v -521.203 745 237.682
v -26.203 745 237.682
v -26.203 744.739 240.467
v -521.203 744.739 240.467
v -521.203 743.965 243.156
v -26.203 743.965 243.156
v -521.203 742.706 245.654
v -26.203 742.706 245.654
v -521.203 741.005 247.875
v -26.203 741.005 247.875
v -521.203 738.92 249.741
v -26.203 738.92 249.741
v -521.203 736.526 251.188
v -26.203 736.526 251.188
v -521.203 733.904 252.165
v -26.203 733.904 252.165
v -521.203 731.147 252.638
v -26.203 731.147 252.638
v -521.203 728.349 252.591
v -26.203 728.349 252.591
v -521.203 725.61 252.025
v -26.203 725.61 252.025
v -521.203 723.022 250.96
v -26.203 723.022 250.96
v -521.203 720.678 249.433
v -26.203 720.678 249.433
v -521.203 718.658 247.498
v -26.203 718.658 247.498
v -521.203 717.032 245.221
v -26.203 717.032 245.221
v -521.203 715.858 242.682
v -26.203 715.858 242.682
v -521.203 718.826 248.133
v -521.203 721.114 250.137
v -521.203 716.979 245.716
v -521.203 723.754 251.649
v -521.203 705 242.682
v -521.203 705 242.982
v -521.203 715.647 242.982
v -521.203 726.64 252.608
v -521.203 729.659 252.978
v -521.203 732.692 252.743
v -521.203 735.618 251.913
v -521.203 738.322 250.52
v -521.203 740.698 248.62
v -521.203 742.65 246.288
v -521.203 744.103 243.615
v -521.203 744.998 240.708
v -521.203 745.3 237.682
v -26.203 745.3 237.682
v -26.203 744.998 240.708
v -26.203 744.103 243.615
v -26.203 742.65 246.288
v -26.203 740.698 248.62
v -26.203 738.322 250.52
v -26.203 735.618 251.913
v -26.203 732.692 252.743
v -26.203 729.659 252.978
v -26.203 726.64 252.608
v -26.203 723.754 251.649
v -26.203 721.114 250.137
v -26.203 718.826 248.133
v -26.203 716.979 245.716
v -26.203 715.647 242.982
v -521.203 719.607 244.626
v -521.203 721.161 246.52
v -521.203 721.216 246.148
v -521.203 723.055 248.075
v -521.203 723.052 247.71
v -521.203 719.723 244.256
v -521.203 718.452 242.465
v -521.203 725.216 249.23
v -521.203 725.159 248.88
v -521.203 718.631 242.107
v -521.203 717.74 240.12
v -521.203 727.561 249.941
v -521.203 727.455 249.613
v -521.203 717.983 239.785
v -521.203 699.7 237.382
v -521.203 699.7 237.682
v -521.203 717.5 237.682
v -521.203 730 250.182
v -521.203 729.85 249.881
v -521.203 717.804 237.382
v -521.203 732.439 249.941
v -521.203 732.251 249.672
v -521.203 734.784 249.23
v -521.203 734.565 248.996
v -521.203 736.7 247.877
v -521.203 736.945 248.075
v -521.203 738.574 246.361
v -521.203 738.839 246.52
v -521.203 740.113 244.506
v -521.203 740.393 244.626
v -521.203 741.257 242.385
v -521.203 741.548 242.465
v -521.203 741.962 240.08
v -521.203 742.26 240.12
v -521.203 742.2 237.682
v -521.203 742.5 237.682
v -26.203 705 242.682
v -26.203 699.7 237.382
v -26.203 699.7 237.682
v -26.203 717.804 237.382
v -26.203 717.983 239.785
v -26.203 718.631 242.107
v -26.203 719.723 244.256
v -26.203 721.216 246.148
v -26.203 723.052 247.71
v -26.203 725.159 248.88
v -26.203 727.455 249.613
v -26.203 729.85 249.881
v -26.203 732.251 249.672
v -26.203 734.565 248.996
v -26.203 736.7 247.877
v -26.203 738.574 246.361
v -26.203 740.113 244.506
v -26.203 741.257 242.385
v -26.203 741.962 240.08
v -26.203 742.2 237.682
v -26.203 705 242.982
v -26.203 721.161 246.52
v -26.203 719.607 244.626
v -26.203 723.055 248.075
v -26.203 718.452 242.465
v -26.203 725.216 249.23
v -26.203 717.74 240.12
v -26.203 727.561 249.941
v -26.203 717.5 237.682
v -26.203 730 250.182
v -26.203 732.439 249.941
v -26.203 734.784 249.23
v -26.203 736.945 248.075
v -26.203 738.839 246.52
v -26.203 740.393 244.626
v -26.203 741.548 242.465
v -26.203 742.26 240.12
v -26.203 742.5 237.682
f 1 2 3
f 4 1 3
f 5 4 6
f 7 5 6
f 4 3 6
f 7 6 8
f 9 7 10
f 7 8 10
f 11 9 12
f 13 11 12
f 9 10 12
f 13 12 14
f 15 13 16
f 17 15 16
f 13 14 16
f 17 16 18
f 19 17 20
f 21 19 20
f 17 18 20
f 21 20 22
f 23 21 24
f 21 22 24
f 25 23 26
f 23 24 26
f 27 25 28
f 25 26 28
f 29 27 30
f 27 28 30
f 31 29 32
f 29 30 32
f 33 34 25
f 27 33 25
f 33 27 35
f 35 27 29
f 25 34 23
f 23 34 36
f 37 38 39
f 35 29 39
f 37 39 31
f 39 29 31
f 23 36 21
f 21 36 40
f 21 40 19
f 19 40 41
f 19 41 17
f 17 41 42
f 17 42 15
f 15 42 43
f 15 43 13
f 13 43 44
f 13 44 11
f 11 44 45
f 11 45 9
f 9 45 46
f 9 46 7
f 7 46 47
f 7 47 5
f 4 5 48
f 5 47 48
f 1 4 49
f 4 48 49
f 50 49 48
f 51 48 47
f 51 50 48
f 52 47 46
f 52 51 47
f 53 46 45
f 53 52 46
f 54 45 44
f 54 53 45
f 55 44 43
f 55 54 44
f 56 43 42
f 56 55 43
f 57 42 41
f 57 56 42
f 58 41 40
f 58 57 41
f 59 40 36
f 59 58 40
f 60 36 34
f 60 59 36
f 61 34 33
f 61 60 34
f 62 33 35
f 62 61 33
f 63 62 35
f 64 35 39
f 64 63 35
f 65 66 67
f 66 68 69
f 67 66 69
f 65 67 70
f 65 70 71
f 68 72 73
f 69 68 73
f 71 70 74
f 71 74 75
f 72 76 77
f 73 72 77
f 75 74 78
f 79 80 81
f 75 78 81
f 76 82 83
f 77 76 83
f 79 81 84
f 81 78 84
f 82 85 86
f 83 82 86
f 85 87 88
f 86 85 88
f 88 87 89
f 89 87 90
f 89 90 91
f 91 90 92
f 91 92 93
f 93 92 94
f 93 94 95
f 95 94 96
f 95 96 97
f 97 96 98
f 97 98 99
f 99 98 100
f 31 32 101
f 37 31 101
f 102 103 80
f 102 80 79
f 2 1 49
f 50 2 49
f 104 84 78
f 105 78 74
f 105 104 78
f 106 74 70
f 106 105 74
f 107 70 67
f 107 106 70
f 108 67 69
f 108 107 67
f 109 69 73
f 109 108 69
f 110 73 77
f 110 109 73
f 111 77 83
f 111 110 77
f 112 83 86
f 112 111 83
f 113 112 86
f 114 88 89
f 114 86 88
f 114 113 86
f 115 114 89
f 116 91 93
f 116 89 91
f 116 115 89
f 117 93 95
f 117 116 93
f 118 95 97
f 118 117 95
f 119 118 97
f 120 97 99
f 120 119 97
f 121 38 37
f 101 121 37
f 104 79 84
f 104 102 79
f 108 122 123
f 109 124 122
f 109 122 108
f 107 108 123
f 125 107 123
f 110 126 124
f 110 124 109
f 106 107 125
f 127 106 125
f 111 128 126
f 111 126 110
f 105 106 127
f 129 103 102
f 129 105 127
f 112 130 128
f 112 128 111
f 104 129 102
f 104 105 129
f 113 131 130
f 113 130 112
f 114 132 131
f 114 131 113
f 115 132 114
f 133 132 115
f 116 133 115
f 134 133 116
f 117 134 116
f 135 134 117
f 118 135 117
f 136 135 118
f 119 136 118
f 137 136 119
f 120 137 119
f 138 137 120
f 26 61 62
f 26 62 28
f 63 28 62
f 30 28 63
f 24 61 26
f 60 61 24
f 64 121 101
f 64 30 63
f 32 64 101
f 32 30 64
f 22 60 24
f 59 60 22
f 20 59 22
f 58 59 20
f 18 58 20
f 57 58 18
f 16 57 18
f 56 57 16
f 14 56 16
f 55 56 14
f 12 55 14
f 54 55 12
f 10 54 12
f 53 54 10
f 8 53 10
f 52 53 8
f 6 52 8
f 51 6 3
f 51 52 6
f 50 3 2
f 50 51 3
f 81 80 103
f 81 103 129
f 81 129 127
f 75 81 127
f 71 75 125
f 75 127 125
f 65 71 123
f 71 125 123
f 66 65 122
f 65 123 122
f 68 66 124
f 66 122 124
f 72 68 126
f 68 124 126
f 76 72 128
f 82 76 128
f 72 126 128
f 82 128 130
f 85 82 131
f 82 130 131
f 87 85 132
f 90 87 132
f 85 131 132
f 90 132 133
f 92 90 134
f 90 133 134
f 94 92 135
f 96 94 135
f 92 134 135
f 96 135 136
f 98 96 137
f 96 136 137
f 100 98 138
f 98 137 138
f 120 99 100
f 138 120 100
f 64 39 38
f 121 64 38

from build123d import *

# Parameters (mm, degrees)
DODANIE_WYCI_GNI_CIE1_DEPTH = 495
SKORUPA1_T                  = 0.3
SZKIC2_W                    = 0.537419475
SZKIC2_H                    = 5.433036789
WYTNIJ_WYCI_GNI_CIE1_DEPTH  = 930.783201162
WYTNIJ_WYCI_GNI_CIE2_DEPTH  = 930.783201162


with BuildPart() as part:
    # Szkic1 → Dodanie-wyciągnięcie1 (new body)
    with BuildSketch(Plane(origin=(-26.202987023, 0, 0), x_dir=(0, 0, -1), z_dir=(1, 0, 0))):
        with BuildLine():
            Line((-237.681641948, 742.5), (-237.681641948, 745))
            ThreePointArc((-237.681641948, 745), (-252.465620342, 732.536529681), (-242.681641948, 715.857864376))
            Line((-242.681641948, 715.857864376), (-242.681641948, 705))
            Line((-242.681641948, 705), (-237.681641948, 700))
            Line((-237.681641948, 700), (-237.681641948, 717.5))
            ThreePointArc((-237.681641948, 717.5), (-250.181641948, 730), (-237.681641948, 742.5))
        make_face()
    extrude(amount=-DODANIE_WYCI_GNI_CIE1_DEPTH)

    # Skorupa1
    skorupa1_openings = [part.faces().sort_by_distance(p)[0] for p in [
        (-26.202987023, 743.75, 238.155983597),
        (-521.202987023, 743.75, 238.155983597),
    ]]
    offset(amount=SKORUPA1_T, openings=skorupa1_openings, kind=Kind.INTERSECTION)

    # Szkic2 → Wytnij-wyciągnięcie1 (cut, through all)
    with BuildSketch(Plane.ZY.offset(521.202987023)):
        Polygon((242.681641948, 705), (237.681641948, 705), (237.681641948, 695.383160832), (244.897619128, 695.383160832), (244.897619128, 705), align=None)
        with Locations((237.412932211, 743.996017968)):
            Rectangle(SZKIC2_W, SZKIC2_H)
    extrude(amount=-WYTNIJ_WYCI_GNI_CIE1_DEPTH, mode=Mode.SUBTRACT)


with BuildPart() as wytnij_wyci_gni_cie1_piece_1:
    # of the separate pieces the step leaves, piece 1, a body of its own (wytnij_wyci_gni_cie1_pieces)
    add(part.part.solids().sort_by_distance((-26.202987023, 717.5, 237.681641948))[0])

    # Szkic3 → Wytnij-wyciągnięcie2 (cut, through all)
    with BuildSketch(Plane(origin=(-26.202987023, 0, 0), x_dir=(0, 0, -1), z_dir=(1, 0, 0))):
        Polygon((-237.681641948, 699.7), (-237.13154062, 699.7), (-237.13154062, 698.976022056), (-237.977292852, 698.976022056), align=None)
    extrude(amount=-WYTNIJ_WYCI_GNI_CIE2_DEPTH, mode=Mode.SUBTRACT)


with BuildPart() as wytnij_wyci_gni_cie1_piece_2:
    # of the separate pieces the step leaves, piece 2, a body of its own (wytnij_wyci_gni_cie1_pieces)
    add(part.part.solids().sort_by_distance((-26.202987023, 745, 237.681641948))[0])


solid = Compound([wytnij_wyci_gni_cie1_piece_1.part, wytnij_wyci_gni_cie1_piece_2.part])
